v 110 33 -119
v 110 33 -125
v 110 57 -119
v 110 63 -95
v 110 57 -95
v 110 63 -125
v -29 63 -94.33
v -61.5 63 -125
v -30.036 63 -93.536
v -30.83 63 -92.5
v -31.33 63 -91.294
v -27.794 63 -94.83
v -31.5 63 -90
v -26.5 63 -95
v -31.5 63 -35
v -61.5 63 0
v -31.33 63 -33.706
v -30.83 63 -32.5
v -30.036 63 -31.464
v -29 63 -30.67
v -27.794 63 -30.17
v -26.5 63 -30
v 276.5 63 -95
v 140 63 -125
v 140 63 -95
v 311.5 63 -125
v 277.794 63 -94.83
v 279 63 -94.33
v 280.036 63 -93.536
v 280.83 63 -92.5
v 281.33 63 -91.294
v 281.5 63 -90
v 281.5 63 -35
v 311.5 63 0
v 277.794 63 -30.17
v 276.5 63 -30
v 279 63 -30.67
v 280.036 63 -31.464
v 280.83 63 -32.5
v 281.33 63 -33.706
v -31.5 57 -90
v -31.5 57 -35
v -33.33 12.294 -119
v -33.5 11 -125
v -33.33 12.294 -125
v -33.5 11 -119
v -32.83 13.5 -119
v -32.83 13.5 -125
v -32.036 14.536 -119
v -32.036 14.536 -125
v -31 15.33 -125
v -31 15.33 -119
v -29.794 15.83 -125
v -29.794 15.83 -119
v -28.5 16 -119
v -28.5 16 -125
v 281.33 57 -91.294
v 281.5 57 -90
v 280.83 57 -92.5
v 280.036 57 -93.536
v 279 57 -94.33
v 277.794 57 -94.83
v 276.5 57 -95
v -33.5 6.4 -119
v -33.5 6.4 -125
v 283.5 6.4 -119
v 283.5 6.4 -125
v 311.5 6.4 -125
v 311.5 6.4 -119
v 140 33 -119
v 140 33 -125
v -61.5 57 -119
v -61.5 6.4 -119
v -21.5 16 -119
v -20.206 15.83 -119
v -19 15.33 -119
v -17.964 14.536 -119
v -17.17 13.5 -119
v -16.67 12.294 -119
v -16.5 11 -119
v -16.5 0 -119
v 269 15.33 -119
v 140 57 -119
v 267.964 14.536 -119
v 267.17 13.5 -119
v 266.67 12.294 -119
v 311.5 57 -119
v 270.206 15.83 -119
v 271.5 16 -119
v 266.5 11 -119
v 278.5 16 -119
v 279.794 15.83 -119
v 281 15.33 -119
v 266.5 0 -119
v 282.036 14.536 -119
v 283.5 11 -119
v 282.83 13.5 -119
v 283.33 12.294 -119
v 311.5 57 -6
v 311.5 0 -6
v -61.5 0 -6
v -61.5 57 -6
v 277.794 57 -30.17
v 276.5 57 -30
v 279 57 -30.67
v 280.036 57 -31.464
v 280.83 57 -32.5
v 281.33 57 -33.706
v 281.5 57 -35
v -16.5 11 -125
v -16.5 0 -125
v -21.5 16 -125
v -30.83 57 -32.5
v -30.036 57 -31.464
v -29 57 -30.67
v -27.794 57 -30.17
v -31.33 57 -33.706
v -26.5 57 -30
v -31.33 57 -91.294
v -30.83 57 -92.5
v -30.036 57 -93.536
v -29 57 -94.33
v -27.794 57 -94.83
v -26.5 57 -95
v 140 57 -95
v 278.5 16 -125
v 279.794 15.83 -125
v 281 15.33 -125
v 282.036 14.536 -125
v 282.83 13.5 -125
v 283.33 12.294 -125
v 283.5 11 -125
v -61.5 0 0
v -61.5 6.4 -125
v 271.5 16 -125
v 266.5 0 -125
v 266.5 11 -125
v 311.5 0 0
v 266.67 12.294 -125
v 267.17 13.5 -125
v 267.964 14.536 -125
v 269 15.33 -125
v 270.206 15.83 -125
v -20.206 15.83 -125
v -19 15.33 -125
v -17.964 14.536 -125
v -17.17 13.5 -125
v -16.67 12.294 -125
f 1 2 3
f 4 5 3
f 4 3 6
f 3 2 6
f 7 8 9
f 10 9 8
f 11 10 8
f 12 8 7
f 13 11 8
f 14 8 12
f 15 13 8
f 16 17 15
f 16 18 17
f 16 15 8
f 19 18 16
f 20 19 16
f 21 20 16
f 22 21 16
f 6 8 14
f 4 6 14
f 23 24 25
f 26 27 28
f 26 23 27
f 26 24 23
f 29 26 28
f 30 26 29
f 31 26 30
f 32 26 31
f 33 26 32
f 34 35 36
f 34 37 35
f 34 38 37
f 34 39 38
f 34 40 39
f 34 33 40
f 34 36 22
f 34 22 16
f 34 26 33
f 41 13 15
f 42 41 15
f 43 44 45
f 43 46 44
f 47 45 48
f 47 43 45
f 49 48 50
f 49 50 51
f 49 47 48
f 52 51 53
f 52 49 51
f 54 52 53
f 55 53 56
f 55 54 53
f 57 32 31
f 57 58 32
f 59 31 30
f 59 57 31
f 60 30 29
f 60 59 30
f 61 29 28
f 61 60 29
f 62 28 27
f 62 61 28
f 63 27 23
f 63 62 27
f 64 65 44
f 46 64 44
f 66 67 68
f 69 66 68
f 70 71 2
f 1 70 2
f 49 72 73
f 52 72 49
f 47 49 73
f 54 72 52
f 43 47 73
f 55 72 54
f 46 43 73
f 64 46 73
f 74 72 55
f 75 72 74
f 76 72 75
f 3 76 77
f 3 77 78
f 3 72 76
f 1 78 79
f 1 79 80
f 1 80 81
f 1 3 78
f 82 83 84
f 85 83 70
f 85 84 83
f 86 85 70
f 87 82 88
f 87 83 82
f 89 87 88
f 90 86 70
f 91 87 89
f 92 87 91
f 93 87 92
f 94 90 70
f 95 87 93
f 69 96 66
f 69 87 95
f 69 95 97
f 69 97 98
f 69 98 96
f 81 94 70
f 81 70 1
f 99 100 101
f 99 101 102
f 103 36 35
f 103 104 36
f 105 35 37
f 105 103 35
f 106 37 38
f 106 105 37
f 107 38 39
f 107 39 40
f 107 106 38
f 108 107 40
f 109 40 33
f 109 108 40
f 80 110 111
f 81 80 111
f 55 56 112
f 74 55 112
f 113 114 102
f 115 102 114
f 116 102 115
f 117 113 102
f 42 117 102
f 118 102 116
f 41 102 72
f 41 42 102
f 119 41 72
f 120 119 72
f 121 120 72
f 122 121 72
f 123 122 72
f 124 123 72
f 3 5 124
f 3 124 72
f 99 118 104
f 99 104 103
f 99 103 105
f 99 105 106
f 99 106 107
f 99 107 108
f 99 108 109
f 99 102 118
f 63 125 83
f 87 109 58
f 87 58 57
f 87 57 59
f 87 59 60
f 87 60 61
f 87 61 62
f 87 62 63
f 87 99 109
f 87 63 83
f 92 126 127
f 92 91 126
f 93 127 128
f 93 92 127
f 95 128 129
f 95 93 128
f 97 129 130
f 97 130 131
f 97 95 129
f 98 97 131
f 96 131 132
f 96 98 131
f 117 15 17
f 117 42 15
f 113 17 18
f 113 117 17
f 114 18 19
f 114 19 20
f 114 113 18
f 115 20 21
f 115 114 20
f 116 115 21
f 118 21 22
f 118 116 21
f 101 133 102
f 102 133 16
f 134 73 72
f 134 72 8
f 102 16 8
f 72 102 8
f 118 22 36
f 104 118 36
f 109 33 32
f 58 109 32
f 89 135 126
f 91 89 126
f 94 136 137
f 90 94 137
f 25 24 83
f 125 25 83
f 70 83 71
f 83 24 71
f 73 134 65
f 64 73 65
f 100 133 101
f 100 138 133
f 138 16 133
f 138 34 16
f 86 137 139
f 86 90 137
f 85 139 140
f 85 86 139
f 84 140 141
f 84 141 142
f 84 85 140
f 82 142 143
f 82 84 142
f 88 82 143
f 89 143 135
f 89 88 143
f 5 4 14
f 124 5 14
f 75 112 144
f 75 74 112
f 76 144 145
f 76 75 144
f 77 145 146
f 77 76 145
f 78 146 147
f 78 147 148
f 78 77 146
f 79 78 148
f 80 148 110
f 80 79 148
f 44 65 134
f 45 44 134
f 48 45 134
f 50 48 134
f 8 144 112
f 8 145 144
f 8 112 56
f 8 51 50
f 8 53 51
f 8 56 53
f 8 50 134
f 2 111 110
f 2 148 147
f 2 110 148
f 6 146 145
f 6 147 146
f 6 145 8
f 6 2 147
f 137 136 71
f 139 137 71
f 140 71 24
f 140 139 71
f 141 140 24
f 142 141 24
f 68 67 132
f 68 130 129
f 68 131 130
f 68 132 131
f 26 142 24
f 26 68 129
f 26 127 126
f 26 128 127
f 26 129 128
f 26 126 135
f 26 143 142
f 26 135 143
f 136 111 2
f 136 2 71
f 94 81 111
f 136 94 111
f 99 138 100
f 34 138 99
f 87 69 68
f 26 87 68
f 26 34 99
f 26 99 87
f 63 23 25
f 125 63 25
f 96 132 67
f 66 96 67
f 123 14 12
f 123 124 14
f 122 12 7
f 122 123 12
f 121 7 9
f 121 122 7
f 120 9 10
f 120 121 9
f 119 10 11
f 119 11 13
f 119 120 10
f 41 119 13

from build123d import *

# Parameters (mm, degrees)
BOSS_EXTRUDE1_DEPTH      = 311.5
BOSS_EXTRUDE1_DEPTH_BACK = 61.5
SKETCH2_R                = 4.34
SKETCH2_W                = 30
SKETCH2_H                = 24
SKETCH2_H_2              = 6
CORTAR_EXTRUIR1_DEPTH    = 30
CORTAR_EXTRUIR3_REACH    = 65
REDONDEO1_R              = 5


with BuildPart() as part:
    # Sketch1 → Boss-Extrude1 (new body, two sides)
    with BuildSketch(Plane(origin=(0, 0, 0), x_dir=(0, 0, -1), z_dir=(1, 0, 0))) as boss_extrude1_sk:
        Polygon((0, 0), (6, 0), (6, 57), (119, 57), (119, 0), (125, 0), (125, 63), (0, 63), align=None)
    extrude(amount=BOSS_EXTRUDE1_DEPTH)
    extrude(boss_extrude1_sk.sketch, amount=-BOSS_EXTRUDE1_DEPTH_BACK)

    # Sketch2 → Cortar-Extruir1 (cut)
    with BuildSketch(Plane(origin=(0, 0, -125), x_dir=(-1, 0, 0), z_dir=(0, 0, -1))):
        Polygon((-311.5, 0), (-266.5, 0), (-266.5, 16), (-283.5, 16), (-283.5, 6.4), (-311.5, 6.4), align=None)
        with Locations((-277.52, 10.9)):
            Circle(SKETCH2_R, mode=Mode.SUBTRACT)
        with Locations((-277.52, 10.9)):
            Circle(SKETCH2_R)
        with Locations((-125, 45)):
            Rectangle(SKETCH2_W, SKETCH2_H)
        with Locations((-125, 60)):
            Rectangle(SKETCH2_W, SKETCH2_H_2)
        Polygon((16.5, 16), (16.5, 0), (61.5, 0), (61.5, 6.4), (33.5, 6.4), (33.5, 16), align=None)
    extrude(amount=-CORTAR_EXTRUIR1_DEPTH, mode=Mode.SUBTRACT)

    # Croquis1 → Cortar-Extruir3 (cut, up to next)
    with BuildSketch(Plane(origin=(0, 63, 0), x_dir=(1, 0, 0), z_dir=(0, 1, 0)), mode=Mode.PRIVATE) as cortar_extruir3_sk1:
        Polygon((-31.5, 95), (-31.5, 30), (281.5, 30), (281.5, 95), (170, 95), (140, 95), (110, 95), (80, 95), align=None)
    cortar_extruir3_tool1 = extrude(cortar_extruir3_sk1.sketch, amount=-CORTAR_EXTRUIR3_REACH, mode=Mode.PRIVATE) & part.part
    add(cortar_extruir3_tool1.solids().sort_by_distance((125, 63, -62.5))[0], mode=Mode.SUBTRACT)

    # Redondeo1
    redondeo1_edges = [part.edges().sort_by_distance(p)[0] for p in [
        (-16.5, 16, -122),
        (-33.5, 16, -122),
        (-31.5, 60, -95),
        (281.5, 60, -95),
        (281.5, 60, -30),
        (-31.5, 60, -30),
        (283.5, 16, -122),
        (266.5, 16, -122),
    ]]
    fillet(redondeo1_edges, radius=REDONDEO1_R)


solid = part.part
